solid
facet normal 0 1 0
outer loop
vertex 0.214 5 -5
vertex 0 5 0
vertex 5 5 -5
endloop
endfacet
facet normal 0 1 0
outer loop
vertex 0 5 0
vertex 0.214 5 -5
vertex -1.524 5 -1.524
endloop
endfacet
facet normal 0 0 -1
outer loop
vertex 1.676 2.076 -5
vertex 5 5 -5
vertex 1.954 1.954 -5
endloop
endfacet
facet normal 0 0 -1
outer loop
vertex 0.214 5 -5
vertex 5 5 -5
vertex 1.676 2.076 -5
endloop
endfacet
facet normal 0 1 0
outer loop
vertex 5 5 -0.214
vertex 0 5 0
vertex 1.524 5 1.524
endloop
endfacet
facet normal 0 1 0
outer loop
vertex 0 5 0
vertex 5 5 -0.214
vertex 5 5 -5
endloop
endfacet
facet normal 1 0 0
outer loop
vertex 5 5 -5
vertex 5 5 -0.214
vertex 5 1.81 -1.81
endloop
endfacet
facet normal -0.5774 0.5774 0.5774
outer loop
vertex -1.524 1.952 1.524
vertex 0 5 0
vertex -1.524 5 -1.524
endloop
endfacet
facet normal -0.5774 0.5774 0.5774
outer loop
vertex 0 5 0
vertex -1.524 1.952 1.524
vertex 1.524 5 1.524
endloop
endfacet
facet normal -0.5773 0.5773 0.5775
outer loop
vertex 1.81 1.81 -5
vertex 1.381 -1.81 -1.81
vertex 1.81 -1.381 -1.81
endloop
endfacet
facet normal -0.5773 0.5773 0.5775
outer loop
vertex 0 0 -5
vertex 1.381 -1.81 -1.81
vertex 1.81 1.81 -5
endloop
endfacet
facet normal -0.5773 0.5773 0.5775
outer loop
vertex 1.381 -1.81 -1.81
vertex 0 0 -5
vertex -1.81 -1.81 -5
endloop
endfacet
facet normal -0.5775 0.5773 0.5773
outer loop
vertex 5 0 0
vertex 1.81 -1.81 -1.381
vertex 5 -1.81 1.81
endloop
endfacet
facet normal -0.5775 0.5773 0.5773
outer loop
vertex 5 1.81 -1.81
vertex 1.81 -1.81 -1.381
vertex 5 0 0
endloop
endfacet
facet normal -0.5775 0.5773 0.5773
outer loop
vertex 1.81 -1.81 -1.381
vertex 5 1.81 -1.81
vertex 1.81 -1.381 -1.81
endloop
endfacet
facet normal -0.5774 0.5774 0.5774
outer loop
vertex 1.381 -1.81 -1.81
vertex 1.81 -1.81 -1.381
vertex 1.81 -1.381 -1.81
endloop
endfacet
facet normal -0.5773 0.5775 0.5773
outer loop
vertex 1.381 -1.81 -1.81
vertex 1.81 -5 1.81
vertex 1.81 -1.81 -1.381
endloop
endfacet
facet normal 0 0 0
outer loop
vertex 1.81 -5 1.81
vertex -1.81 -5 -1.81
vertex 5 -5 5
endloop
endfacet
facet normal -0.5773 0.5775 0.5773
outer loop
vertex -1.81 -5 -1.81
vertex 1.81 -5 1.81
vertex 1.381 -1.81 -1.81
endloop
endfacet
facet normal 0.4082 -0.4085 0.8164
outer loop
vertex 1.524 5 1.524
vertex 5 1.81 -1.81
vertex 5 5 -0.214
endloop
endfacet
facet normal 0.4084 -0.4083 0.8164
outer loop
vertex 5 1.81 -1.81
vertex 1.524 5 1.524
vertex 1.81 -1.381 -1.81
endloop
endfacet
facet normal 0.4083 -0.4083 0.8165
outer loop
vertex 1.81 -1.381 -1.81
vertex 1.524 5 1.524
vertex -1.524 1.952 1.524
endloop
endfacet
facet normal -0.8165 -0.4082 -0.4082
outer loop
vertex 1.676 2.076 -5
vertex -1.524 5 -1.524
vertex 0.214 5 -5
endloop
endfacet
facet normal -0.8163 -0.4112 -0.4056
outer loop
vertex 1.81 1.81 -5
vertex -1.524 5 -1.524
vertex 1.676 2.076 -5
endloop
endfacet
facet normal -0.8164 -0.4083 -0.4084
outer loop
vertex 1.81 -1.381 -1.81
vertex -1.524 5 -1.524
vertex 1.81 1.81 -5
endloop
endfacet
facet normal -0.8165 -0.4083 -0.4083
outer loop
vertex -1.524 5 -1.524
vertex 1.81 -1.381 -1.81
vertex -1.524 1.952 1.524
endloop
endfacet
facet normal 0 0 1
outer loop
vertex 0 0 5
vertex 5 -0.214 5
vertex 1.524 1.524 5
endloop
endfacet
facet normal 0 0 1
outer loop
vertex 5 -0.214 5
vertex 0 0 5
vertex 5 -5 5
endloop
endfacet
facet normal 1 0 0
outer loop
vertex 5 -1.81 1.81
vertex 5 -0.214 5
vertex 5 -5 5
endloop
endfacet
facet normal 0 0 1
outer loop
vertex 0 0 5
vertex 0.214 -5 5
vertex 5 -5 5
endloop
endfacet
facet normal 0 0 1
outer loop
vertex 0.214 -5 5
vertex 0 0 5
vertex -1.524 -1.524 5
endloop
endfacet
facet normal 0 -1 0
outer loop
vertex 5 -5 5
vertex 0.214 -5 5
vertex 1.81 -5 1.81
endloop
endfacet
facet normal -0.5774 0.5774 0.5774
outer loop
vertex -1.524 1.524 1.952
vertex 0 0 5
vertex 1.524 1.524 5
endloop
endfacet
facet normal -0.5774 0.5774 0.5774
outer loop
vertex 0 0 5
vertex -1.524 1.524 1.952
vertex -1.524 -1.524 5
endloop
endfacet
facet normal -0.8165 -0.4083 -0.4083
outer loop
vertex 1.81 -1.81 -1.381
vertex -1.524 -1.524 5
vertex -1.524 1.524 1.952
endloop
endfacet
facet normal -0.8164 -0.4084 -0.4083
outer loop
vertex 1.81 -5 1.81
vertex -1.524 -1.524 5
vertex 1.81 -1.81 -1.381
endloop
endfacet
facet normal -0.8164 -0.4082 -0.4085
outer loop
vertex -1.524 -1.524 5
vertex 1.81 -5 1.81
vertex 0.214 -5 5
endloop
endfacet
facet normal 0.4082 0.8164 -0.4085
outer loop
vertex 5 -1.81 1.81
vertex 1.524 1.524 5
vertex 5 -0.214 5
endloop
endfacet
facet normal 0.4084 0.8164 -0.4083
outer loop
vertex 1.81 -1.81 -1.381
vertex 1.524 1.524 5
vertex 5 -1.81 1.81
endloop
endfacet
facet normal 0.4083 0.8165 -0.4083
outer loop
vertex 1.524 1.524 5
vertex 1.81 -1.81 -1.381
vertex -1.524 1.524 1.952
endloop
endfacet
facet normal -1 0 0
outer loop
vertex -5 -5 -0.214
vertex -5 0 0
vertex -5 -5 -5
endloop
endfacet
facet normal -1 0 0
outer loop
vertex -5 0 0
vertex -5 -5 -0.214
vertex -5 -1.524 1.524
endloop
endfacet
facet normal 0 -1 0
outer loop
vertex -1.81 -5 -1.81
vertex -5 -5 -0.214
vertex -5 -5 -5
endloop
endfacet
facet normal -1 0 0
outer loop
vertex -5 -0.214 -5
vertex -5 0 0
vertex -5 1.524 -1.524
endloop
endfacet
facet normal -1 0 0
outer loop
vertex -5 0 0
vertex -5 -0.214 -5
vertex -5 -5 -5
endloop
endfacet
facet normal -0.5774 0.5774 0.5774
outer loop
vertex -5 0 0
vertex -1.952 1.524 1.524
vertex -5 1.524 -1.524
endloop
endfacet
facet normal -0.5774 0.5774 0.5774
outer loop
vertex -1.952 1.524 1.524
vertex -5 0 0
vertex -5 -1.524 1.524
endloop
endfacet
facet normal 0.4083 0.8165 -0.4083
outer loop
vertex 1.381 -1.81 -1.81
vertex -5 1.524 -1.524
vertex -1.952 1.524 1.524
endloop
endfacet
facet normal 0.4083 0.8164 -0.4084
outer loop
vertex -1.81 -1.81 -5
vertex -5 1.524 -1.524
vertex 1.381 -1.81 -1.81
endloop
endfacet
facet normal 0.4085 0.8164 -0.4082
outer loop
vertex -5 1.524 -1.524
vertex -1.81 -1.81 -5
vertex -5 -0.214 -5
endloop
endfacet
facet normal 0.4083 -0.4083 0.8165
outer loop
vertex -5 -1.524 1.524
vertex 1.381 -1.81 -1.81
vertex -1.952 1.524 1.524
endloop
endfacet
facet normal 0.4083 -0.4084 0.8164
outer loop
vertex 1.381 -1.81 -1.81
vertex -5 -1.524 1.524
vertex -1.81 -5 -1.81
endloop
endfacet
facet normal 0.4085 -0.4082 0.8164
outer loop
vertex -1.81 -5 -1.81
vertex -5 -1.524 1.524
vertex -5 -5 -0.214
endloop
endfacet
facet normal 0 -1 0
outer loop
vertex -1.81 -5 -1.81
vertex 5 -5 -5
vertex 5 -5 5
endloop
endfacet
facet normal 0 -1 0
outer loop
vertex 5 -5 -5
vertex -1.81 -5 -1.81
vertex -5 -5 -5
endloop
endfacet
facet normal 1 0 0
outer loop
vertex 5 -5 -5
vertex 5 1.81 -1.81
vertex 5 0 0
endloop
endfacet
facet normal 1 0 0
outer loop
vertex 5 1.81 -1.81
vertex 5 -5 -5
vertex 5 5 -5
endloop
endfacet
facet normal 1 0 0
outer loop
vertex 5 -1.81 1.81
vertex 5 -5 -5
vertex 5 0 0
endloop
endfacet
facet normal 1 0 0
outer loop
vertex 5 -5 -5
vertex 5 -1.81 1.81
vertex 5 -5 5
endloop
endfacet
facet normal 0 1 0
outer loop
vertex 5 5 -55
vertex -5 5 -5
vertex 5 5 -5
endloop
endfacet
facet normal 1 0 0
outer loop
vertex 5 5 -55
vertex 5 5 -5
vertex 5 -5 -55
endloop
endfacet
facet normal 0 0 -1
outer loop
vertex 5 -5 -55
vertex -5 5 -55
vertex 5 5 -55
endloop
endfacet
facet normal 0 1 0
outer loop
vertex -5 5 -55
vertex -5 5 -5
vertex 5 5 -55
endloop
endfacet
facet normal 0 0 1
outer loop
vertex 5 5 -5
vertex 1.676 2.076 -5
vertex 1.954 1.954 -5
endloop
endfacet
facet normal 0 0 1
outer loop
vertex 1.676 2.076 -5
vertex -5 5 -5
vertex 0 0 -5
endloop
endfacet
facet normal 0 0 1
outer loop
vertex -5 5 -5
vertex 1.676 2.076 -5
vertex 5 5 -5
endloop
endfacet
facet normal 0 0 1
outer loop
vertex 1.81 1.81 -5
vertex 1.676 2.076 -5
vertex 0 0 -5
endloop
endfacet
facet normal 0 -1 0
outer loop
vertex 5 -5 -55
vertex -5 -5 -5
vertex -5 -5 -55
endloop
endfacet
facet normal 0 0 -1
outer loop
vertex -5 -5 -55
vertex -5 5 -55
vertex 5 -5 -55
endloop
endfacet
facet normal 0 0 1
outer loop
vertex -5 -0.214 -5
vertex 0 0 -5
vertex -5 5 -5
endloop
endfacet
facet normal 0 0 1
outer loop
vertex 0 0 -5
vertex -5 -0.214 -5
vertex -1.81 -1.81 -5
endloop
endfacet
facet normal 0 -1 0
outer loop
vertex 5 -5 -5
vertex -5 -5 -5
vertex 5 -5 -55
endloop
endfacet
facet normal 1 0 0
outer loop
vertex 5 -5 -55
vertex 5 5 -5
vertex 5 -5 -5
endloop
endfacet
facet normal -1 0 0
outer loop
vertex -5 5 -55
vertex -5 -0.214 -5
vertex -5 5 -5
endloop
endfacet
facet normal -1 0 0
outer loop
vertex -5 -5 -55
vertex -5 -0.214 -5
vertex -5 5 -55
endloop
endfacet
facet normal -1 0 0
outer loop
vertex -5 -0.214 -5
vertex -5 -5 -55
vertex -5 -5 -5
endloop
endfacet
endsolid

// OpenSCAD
// OpenSCAD 为免费开源的跨平台建模软件
// 作者：上海市第三女子初级中学 谢丁

a = 10; // 立方体的边长
e = 0.35; // 咬合面距离调整，数值越小，咬合精度越高
length = norm([a, a, a]); // 欧氏距离
b = acos(a / length); // 倾斜角
c = atan2(a, a);    // 方位角

rotate([-90, 0, 0]) rotate([-c, 0, 0]) rotate([0, 0, b])
{
  for (i = [1:3]) // 循环三次
  {
    rotate([i * 120, 0, 0]) // 每隔120°生成一个正三棱柱结构
    intersection() // 相交布尔运算
    {
      difference() // 相减布尔运算
      {
        rotate([0, -c, 90 - b]) cube([a, a, a], center = true); // 原始立方体
        translate([-length / 3, 0, 0]) cube([sqrt(3)*a / 3, sqrt(3)*a, sqrt(3)*a], center = true); // 左侧的立方体结构
        translate([length / 3, 0, 0]) cube([sqrt(3)*a / 3, sqrt(3)*a, sqrt(3)*a], center = true); // 右侧的立方体结构
      }
      // 正三棱柱结构
      translate([0, sqrt(3)*a / 2 + e, 0]) rotate([30, 0, 0]) rotate([0, 90, 0]) cylinder(h = sqrt(3) * a / 3, r = sqrt(3) * a / 2, $fn = 3, center = true);
    }
  }
  // 接触面榫头基座
  intersection() 
  {
    rotate([0, -c, 90 - b]) cube([a, a, a], center = true);
    translate([length / 3, 0, 0]) cube([sqrt(3)*a / 3, sqrt(3)*a, sqrt(3)*a], center = true);
  }
  translate([sqrt(3)*a / 2, 0, 0]) rotate([0, -c, 90 - b]) cube([5 * a, a, a], center = false); // 5*a 为柄长
}
